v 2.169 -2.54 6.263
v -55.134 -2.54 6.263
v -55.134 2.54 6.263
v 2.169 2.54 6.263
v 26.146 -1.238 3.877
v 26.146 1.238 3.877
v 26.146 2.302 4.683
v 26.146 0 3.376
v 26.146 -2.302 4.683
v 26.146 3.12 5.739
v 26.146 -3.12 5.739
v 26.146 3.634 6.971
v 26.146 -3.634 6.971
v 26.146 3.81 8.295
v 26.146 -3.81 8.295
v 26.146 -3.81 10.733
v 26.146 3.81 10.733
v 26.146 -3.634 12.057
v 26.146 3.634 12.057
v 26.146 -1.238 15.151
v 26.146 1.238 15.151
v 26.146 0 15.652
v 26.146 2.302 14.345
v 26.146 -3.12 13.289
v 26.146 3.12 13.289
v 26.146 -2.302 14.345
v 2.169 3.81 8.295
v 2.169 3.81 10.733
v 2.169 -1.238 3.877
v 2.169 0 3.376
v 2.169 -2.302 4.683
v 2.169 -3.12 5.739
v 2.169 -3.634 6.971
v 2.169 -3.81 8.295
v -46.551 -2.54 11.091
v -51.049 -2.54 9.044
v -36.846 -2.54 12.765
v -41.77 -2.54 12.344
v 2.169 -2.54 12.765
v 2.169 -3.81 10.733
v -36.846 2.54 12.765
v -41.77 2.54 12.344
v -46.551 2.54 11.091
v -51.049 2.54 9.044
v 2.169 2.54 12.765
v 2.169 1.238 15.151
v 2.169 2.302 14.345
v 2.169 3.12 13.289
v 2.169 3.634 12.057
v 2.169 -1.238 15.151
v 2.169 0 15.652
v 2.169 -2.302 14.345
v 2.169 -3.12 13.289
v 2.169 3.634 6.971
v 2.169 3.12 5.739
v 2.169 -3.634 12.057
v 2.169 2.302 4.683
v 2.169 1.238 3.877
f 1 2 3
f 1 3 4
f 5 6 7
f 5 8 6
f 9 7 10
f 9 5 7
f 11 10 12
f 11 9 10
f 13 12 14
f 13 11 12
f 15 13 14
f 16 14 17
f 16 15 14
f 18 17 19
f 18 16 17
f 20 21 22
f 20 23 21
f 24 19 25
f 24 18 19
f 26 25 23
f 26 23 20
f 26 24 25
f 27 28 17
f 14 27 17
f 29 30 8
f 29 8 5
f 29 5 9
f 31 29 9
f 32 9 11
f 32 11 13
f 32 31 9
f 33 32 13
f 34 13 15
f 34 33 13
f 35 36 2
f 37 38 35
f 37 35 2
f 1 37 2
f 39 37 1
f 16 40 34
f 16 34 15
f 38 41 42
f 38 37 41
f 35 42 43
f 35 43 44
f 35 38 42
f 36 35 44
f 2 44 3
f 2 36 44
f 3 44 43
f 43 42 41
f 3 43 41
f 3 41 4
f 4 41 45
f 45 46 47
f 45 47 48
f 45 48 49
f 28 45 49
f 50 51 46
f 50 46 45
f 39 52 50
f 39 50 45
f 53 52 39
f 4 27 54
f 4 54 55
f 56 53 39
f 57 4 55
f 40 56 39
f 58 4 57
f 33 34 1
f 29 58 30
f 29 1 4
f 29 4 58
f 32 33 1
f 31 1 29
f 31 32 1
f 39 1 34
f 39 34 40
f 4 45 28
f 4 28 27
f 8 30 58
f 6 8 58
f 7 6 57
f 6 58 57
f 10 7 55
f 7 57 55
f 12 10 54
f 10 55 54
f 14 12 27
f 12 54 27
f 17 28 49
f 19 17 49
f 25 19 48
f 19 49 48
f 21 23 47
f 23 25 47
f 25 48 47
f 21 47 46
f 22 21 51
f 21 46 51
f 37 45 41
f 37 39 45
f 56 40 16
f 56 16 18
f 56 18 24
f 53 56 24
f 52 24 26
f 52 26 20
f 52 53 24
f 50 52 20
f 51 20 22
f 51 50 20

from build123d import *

# Parameters (mm, degrees)
F1_DEPTH    = 2.54
F2_DEPTH    = 3.81
F3_T1_DEPTH = 49.3776003865


# Not quite as in the source:
# - a fillet or chamfer that OpenCascade refuses, or shapes differently, is made with other operations: its cross-section is extruded or revolved along the edge and cut away or added


with BuildPart() as f1:
    # F0 (on Front) → F1 (new body, symmetric)
    with BuildSketch(Plane.XZ):
        with BuildLine():
            ThreePointArc((-36.8458546815, 12.765225481), (-46.5506501675, 11.0912601627), (-55.133856614, 6.2628253844))
            Line((-55.133856614, 6.2628253844), (2.168544932, 6.2628253844))
            Line((2.168544932, 6.2628253844), (2.168544932, 9.5140254327))
            Line((2.168544932, 9.5140254327), (2.168544932, 12.765225481))
            Line((2.168544932, 12.765225481), (-36.8458546815, 12.765225481))
        make_face()
    extrude(amount=F1_DEPTH, both=True)

    # F0 (on Front) → F2 (join, symmetric)
    with BuildSketch(Plane.XZ):
        Polygon((2.168544932, 9.5140254327), (2.168544932, 6.2628253844), (2.168544932, 3.2148253844), (26.1461453185, 3.2148253844), (26.1461453185, 9.5140254327), align=None)
        Polygon((2.168544932, 12.765225481), (2.168544932, 9.5140254327), (26.1461453185, 9.5140254327), (26.1461453185, 15.813225481), (2.168544932, 15.813225481), align=None)
    extrude(amount=F2_DEPTH, both=True)

    # F3: fillet of radius 5.08 on 4 edges, made by hand

    # F3_s2 → F3_t1 (cut)
    with BuildSketch(Plane.YZ.offset(-10.531455068)):
        with BuildLine():
            ThreePointArc((-3.81, 10.733225481), (-2.3221024484, 14.3253279294), (1.27, 15.813225481))
            Line((1.27, 15.813225481), (-3.81, 15.813225481))
            Line((-3.81, 15.813225481), (-3.81, 10.733225481))
        make_face()
        with BuildLine():
            ThreePointArc((1.27, 3.2148253844), (-2.3221024484, 4.7027229359), (-3.81, 8.2948253844))
            Line((-3.81, 8.2948253844), (-3.81, 3.2148253844))
            Line((-3.81, 3.2148253844), (1.27, 3.2148253844))
        make_face()
        with BuildLine():
            ThreePointArc((3.81, 10.733225481), (2.3221024484, 14.3253279294), (-1.27, 15.813225481))
            Line((-1.27, 15.813225481), (3.81, 15.813225481))
            Line((3.81, 15.813225481), (3.81, 10.733225481))
        make_face()
        with BuildLine():
            ThreePointArc((-1.27, 3.2148253844), (2.3221024484, 4.7027229359), (3.81, 8.2948253844))
            Line((3.81, 8.2948253844), (3.81, 3.2148253844))
            Line((3.81, 3.2148253844), (-1.27, 3.2148253844))
        make_face()
    extrude(amount=F3_T1_DEPTH, mode=Mode.SUBTRACT)


solid = f1.part
